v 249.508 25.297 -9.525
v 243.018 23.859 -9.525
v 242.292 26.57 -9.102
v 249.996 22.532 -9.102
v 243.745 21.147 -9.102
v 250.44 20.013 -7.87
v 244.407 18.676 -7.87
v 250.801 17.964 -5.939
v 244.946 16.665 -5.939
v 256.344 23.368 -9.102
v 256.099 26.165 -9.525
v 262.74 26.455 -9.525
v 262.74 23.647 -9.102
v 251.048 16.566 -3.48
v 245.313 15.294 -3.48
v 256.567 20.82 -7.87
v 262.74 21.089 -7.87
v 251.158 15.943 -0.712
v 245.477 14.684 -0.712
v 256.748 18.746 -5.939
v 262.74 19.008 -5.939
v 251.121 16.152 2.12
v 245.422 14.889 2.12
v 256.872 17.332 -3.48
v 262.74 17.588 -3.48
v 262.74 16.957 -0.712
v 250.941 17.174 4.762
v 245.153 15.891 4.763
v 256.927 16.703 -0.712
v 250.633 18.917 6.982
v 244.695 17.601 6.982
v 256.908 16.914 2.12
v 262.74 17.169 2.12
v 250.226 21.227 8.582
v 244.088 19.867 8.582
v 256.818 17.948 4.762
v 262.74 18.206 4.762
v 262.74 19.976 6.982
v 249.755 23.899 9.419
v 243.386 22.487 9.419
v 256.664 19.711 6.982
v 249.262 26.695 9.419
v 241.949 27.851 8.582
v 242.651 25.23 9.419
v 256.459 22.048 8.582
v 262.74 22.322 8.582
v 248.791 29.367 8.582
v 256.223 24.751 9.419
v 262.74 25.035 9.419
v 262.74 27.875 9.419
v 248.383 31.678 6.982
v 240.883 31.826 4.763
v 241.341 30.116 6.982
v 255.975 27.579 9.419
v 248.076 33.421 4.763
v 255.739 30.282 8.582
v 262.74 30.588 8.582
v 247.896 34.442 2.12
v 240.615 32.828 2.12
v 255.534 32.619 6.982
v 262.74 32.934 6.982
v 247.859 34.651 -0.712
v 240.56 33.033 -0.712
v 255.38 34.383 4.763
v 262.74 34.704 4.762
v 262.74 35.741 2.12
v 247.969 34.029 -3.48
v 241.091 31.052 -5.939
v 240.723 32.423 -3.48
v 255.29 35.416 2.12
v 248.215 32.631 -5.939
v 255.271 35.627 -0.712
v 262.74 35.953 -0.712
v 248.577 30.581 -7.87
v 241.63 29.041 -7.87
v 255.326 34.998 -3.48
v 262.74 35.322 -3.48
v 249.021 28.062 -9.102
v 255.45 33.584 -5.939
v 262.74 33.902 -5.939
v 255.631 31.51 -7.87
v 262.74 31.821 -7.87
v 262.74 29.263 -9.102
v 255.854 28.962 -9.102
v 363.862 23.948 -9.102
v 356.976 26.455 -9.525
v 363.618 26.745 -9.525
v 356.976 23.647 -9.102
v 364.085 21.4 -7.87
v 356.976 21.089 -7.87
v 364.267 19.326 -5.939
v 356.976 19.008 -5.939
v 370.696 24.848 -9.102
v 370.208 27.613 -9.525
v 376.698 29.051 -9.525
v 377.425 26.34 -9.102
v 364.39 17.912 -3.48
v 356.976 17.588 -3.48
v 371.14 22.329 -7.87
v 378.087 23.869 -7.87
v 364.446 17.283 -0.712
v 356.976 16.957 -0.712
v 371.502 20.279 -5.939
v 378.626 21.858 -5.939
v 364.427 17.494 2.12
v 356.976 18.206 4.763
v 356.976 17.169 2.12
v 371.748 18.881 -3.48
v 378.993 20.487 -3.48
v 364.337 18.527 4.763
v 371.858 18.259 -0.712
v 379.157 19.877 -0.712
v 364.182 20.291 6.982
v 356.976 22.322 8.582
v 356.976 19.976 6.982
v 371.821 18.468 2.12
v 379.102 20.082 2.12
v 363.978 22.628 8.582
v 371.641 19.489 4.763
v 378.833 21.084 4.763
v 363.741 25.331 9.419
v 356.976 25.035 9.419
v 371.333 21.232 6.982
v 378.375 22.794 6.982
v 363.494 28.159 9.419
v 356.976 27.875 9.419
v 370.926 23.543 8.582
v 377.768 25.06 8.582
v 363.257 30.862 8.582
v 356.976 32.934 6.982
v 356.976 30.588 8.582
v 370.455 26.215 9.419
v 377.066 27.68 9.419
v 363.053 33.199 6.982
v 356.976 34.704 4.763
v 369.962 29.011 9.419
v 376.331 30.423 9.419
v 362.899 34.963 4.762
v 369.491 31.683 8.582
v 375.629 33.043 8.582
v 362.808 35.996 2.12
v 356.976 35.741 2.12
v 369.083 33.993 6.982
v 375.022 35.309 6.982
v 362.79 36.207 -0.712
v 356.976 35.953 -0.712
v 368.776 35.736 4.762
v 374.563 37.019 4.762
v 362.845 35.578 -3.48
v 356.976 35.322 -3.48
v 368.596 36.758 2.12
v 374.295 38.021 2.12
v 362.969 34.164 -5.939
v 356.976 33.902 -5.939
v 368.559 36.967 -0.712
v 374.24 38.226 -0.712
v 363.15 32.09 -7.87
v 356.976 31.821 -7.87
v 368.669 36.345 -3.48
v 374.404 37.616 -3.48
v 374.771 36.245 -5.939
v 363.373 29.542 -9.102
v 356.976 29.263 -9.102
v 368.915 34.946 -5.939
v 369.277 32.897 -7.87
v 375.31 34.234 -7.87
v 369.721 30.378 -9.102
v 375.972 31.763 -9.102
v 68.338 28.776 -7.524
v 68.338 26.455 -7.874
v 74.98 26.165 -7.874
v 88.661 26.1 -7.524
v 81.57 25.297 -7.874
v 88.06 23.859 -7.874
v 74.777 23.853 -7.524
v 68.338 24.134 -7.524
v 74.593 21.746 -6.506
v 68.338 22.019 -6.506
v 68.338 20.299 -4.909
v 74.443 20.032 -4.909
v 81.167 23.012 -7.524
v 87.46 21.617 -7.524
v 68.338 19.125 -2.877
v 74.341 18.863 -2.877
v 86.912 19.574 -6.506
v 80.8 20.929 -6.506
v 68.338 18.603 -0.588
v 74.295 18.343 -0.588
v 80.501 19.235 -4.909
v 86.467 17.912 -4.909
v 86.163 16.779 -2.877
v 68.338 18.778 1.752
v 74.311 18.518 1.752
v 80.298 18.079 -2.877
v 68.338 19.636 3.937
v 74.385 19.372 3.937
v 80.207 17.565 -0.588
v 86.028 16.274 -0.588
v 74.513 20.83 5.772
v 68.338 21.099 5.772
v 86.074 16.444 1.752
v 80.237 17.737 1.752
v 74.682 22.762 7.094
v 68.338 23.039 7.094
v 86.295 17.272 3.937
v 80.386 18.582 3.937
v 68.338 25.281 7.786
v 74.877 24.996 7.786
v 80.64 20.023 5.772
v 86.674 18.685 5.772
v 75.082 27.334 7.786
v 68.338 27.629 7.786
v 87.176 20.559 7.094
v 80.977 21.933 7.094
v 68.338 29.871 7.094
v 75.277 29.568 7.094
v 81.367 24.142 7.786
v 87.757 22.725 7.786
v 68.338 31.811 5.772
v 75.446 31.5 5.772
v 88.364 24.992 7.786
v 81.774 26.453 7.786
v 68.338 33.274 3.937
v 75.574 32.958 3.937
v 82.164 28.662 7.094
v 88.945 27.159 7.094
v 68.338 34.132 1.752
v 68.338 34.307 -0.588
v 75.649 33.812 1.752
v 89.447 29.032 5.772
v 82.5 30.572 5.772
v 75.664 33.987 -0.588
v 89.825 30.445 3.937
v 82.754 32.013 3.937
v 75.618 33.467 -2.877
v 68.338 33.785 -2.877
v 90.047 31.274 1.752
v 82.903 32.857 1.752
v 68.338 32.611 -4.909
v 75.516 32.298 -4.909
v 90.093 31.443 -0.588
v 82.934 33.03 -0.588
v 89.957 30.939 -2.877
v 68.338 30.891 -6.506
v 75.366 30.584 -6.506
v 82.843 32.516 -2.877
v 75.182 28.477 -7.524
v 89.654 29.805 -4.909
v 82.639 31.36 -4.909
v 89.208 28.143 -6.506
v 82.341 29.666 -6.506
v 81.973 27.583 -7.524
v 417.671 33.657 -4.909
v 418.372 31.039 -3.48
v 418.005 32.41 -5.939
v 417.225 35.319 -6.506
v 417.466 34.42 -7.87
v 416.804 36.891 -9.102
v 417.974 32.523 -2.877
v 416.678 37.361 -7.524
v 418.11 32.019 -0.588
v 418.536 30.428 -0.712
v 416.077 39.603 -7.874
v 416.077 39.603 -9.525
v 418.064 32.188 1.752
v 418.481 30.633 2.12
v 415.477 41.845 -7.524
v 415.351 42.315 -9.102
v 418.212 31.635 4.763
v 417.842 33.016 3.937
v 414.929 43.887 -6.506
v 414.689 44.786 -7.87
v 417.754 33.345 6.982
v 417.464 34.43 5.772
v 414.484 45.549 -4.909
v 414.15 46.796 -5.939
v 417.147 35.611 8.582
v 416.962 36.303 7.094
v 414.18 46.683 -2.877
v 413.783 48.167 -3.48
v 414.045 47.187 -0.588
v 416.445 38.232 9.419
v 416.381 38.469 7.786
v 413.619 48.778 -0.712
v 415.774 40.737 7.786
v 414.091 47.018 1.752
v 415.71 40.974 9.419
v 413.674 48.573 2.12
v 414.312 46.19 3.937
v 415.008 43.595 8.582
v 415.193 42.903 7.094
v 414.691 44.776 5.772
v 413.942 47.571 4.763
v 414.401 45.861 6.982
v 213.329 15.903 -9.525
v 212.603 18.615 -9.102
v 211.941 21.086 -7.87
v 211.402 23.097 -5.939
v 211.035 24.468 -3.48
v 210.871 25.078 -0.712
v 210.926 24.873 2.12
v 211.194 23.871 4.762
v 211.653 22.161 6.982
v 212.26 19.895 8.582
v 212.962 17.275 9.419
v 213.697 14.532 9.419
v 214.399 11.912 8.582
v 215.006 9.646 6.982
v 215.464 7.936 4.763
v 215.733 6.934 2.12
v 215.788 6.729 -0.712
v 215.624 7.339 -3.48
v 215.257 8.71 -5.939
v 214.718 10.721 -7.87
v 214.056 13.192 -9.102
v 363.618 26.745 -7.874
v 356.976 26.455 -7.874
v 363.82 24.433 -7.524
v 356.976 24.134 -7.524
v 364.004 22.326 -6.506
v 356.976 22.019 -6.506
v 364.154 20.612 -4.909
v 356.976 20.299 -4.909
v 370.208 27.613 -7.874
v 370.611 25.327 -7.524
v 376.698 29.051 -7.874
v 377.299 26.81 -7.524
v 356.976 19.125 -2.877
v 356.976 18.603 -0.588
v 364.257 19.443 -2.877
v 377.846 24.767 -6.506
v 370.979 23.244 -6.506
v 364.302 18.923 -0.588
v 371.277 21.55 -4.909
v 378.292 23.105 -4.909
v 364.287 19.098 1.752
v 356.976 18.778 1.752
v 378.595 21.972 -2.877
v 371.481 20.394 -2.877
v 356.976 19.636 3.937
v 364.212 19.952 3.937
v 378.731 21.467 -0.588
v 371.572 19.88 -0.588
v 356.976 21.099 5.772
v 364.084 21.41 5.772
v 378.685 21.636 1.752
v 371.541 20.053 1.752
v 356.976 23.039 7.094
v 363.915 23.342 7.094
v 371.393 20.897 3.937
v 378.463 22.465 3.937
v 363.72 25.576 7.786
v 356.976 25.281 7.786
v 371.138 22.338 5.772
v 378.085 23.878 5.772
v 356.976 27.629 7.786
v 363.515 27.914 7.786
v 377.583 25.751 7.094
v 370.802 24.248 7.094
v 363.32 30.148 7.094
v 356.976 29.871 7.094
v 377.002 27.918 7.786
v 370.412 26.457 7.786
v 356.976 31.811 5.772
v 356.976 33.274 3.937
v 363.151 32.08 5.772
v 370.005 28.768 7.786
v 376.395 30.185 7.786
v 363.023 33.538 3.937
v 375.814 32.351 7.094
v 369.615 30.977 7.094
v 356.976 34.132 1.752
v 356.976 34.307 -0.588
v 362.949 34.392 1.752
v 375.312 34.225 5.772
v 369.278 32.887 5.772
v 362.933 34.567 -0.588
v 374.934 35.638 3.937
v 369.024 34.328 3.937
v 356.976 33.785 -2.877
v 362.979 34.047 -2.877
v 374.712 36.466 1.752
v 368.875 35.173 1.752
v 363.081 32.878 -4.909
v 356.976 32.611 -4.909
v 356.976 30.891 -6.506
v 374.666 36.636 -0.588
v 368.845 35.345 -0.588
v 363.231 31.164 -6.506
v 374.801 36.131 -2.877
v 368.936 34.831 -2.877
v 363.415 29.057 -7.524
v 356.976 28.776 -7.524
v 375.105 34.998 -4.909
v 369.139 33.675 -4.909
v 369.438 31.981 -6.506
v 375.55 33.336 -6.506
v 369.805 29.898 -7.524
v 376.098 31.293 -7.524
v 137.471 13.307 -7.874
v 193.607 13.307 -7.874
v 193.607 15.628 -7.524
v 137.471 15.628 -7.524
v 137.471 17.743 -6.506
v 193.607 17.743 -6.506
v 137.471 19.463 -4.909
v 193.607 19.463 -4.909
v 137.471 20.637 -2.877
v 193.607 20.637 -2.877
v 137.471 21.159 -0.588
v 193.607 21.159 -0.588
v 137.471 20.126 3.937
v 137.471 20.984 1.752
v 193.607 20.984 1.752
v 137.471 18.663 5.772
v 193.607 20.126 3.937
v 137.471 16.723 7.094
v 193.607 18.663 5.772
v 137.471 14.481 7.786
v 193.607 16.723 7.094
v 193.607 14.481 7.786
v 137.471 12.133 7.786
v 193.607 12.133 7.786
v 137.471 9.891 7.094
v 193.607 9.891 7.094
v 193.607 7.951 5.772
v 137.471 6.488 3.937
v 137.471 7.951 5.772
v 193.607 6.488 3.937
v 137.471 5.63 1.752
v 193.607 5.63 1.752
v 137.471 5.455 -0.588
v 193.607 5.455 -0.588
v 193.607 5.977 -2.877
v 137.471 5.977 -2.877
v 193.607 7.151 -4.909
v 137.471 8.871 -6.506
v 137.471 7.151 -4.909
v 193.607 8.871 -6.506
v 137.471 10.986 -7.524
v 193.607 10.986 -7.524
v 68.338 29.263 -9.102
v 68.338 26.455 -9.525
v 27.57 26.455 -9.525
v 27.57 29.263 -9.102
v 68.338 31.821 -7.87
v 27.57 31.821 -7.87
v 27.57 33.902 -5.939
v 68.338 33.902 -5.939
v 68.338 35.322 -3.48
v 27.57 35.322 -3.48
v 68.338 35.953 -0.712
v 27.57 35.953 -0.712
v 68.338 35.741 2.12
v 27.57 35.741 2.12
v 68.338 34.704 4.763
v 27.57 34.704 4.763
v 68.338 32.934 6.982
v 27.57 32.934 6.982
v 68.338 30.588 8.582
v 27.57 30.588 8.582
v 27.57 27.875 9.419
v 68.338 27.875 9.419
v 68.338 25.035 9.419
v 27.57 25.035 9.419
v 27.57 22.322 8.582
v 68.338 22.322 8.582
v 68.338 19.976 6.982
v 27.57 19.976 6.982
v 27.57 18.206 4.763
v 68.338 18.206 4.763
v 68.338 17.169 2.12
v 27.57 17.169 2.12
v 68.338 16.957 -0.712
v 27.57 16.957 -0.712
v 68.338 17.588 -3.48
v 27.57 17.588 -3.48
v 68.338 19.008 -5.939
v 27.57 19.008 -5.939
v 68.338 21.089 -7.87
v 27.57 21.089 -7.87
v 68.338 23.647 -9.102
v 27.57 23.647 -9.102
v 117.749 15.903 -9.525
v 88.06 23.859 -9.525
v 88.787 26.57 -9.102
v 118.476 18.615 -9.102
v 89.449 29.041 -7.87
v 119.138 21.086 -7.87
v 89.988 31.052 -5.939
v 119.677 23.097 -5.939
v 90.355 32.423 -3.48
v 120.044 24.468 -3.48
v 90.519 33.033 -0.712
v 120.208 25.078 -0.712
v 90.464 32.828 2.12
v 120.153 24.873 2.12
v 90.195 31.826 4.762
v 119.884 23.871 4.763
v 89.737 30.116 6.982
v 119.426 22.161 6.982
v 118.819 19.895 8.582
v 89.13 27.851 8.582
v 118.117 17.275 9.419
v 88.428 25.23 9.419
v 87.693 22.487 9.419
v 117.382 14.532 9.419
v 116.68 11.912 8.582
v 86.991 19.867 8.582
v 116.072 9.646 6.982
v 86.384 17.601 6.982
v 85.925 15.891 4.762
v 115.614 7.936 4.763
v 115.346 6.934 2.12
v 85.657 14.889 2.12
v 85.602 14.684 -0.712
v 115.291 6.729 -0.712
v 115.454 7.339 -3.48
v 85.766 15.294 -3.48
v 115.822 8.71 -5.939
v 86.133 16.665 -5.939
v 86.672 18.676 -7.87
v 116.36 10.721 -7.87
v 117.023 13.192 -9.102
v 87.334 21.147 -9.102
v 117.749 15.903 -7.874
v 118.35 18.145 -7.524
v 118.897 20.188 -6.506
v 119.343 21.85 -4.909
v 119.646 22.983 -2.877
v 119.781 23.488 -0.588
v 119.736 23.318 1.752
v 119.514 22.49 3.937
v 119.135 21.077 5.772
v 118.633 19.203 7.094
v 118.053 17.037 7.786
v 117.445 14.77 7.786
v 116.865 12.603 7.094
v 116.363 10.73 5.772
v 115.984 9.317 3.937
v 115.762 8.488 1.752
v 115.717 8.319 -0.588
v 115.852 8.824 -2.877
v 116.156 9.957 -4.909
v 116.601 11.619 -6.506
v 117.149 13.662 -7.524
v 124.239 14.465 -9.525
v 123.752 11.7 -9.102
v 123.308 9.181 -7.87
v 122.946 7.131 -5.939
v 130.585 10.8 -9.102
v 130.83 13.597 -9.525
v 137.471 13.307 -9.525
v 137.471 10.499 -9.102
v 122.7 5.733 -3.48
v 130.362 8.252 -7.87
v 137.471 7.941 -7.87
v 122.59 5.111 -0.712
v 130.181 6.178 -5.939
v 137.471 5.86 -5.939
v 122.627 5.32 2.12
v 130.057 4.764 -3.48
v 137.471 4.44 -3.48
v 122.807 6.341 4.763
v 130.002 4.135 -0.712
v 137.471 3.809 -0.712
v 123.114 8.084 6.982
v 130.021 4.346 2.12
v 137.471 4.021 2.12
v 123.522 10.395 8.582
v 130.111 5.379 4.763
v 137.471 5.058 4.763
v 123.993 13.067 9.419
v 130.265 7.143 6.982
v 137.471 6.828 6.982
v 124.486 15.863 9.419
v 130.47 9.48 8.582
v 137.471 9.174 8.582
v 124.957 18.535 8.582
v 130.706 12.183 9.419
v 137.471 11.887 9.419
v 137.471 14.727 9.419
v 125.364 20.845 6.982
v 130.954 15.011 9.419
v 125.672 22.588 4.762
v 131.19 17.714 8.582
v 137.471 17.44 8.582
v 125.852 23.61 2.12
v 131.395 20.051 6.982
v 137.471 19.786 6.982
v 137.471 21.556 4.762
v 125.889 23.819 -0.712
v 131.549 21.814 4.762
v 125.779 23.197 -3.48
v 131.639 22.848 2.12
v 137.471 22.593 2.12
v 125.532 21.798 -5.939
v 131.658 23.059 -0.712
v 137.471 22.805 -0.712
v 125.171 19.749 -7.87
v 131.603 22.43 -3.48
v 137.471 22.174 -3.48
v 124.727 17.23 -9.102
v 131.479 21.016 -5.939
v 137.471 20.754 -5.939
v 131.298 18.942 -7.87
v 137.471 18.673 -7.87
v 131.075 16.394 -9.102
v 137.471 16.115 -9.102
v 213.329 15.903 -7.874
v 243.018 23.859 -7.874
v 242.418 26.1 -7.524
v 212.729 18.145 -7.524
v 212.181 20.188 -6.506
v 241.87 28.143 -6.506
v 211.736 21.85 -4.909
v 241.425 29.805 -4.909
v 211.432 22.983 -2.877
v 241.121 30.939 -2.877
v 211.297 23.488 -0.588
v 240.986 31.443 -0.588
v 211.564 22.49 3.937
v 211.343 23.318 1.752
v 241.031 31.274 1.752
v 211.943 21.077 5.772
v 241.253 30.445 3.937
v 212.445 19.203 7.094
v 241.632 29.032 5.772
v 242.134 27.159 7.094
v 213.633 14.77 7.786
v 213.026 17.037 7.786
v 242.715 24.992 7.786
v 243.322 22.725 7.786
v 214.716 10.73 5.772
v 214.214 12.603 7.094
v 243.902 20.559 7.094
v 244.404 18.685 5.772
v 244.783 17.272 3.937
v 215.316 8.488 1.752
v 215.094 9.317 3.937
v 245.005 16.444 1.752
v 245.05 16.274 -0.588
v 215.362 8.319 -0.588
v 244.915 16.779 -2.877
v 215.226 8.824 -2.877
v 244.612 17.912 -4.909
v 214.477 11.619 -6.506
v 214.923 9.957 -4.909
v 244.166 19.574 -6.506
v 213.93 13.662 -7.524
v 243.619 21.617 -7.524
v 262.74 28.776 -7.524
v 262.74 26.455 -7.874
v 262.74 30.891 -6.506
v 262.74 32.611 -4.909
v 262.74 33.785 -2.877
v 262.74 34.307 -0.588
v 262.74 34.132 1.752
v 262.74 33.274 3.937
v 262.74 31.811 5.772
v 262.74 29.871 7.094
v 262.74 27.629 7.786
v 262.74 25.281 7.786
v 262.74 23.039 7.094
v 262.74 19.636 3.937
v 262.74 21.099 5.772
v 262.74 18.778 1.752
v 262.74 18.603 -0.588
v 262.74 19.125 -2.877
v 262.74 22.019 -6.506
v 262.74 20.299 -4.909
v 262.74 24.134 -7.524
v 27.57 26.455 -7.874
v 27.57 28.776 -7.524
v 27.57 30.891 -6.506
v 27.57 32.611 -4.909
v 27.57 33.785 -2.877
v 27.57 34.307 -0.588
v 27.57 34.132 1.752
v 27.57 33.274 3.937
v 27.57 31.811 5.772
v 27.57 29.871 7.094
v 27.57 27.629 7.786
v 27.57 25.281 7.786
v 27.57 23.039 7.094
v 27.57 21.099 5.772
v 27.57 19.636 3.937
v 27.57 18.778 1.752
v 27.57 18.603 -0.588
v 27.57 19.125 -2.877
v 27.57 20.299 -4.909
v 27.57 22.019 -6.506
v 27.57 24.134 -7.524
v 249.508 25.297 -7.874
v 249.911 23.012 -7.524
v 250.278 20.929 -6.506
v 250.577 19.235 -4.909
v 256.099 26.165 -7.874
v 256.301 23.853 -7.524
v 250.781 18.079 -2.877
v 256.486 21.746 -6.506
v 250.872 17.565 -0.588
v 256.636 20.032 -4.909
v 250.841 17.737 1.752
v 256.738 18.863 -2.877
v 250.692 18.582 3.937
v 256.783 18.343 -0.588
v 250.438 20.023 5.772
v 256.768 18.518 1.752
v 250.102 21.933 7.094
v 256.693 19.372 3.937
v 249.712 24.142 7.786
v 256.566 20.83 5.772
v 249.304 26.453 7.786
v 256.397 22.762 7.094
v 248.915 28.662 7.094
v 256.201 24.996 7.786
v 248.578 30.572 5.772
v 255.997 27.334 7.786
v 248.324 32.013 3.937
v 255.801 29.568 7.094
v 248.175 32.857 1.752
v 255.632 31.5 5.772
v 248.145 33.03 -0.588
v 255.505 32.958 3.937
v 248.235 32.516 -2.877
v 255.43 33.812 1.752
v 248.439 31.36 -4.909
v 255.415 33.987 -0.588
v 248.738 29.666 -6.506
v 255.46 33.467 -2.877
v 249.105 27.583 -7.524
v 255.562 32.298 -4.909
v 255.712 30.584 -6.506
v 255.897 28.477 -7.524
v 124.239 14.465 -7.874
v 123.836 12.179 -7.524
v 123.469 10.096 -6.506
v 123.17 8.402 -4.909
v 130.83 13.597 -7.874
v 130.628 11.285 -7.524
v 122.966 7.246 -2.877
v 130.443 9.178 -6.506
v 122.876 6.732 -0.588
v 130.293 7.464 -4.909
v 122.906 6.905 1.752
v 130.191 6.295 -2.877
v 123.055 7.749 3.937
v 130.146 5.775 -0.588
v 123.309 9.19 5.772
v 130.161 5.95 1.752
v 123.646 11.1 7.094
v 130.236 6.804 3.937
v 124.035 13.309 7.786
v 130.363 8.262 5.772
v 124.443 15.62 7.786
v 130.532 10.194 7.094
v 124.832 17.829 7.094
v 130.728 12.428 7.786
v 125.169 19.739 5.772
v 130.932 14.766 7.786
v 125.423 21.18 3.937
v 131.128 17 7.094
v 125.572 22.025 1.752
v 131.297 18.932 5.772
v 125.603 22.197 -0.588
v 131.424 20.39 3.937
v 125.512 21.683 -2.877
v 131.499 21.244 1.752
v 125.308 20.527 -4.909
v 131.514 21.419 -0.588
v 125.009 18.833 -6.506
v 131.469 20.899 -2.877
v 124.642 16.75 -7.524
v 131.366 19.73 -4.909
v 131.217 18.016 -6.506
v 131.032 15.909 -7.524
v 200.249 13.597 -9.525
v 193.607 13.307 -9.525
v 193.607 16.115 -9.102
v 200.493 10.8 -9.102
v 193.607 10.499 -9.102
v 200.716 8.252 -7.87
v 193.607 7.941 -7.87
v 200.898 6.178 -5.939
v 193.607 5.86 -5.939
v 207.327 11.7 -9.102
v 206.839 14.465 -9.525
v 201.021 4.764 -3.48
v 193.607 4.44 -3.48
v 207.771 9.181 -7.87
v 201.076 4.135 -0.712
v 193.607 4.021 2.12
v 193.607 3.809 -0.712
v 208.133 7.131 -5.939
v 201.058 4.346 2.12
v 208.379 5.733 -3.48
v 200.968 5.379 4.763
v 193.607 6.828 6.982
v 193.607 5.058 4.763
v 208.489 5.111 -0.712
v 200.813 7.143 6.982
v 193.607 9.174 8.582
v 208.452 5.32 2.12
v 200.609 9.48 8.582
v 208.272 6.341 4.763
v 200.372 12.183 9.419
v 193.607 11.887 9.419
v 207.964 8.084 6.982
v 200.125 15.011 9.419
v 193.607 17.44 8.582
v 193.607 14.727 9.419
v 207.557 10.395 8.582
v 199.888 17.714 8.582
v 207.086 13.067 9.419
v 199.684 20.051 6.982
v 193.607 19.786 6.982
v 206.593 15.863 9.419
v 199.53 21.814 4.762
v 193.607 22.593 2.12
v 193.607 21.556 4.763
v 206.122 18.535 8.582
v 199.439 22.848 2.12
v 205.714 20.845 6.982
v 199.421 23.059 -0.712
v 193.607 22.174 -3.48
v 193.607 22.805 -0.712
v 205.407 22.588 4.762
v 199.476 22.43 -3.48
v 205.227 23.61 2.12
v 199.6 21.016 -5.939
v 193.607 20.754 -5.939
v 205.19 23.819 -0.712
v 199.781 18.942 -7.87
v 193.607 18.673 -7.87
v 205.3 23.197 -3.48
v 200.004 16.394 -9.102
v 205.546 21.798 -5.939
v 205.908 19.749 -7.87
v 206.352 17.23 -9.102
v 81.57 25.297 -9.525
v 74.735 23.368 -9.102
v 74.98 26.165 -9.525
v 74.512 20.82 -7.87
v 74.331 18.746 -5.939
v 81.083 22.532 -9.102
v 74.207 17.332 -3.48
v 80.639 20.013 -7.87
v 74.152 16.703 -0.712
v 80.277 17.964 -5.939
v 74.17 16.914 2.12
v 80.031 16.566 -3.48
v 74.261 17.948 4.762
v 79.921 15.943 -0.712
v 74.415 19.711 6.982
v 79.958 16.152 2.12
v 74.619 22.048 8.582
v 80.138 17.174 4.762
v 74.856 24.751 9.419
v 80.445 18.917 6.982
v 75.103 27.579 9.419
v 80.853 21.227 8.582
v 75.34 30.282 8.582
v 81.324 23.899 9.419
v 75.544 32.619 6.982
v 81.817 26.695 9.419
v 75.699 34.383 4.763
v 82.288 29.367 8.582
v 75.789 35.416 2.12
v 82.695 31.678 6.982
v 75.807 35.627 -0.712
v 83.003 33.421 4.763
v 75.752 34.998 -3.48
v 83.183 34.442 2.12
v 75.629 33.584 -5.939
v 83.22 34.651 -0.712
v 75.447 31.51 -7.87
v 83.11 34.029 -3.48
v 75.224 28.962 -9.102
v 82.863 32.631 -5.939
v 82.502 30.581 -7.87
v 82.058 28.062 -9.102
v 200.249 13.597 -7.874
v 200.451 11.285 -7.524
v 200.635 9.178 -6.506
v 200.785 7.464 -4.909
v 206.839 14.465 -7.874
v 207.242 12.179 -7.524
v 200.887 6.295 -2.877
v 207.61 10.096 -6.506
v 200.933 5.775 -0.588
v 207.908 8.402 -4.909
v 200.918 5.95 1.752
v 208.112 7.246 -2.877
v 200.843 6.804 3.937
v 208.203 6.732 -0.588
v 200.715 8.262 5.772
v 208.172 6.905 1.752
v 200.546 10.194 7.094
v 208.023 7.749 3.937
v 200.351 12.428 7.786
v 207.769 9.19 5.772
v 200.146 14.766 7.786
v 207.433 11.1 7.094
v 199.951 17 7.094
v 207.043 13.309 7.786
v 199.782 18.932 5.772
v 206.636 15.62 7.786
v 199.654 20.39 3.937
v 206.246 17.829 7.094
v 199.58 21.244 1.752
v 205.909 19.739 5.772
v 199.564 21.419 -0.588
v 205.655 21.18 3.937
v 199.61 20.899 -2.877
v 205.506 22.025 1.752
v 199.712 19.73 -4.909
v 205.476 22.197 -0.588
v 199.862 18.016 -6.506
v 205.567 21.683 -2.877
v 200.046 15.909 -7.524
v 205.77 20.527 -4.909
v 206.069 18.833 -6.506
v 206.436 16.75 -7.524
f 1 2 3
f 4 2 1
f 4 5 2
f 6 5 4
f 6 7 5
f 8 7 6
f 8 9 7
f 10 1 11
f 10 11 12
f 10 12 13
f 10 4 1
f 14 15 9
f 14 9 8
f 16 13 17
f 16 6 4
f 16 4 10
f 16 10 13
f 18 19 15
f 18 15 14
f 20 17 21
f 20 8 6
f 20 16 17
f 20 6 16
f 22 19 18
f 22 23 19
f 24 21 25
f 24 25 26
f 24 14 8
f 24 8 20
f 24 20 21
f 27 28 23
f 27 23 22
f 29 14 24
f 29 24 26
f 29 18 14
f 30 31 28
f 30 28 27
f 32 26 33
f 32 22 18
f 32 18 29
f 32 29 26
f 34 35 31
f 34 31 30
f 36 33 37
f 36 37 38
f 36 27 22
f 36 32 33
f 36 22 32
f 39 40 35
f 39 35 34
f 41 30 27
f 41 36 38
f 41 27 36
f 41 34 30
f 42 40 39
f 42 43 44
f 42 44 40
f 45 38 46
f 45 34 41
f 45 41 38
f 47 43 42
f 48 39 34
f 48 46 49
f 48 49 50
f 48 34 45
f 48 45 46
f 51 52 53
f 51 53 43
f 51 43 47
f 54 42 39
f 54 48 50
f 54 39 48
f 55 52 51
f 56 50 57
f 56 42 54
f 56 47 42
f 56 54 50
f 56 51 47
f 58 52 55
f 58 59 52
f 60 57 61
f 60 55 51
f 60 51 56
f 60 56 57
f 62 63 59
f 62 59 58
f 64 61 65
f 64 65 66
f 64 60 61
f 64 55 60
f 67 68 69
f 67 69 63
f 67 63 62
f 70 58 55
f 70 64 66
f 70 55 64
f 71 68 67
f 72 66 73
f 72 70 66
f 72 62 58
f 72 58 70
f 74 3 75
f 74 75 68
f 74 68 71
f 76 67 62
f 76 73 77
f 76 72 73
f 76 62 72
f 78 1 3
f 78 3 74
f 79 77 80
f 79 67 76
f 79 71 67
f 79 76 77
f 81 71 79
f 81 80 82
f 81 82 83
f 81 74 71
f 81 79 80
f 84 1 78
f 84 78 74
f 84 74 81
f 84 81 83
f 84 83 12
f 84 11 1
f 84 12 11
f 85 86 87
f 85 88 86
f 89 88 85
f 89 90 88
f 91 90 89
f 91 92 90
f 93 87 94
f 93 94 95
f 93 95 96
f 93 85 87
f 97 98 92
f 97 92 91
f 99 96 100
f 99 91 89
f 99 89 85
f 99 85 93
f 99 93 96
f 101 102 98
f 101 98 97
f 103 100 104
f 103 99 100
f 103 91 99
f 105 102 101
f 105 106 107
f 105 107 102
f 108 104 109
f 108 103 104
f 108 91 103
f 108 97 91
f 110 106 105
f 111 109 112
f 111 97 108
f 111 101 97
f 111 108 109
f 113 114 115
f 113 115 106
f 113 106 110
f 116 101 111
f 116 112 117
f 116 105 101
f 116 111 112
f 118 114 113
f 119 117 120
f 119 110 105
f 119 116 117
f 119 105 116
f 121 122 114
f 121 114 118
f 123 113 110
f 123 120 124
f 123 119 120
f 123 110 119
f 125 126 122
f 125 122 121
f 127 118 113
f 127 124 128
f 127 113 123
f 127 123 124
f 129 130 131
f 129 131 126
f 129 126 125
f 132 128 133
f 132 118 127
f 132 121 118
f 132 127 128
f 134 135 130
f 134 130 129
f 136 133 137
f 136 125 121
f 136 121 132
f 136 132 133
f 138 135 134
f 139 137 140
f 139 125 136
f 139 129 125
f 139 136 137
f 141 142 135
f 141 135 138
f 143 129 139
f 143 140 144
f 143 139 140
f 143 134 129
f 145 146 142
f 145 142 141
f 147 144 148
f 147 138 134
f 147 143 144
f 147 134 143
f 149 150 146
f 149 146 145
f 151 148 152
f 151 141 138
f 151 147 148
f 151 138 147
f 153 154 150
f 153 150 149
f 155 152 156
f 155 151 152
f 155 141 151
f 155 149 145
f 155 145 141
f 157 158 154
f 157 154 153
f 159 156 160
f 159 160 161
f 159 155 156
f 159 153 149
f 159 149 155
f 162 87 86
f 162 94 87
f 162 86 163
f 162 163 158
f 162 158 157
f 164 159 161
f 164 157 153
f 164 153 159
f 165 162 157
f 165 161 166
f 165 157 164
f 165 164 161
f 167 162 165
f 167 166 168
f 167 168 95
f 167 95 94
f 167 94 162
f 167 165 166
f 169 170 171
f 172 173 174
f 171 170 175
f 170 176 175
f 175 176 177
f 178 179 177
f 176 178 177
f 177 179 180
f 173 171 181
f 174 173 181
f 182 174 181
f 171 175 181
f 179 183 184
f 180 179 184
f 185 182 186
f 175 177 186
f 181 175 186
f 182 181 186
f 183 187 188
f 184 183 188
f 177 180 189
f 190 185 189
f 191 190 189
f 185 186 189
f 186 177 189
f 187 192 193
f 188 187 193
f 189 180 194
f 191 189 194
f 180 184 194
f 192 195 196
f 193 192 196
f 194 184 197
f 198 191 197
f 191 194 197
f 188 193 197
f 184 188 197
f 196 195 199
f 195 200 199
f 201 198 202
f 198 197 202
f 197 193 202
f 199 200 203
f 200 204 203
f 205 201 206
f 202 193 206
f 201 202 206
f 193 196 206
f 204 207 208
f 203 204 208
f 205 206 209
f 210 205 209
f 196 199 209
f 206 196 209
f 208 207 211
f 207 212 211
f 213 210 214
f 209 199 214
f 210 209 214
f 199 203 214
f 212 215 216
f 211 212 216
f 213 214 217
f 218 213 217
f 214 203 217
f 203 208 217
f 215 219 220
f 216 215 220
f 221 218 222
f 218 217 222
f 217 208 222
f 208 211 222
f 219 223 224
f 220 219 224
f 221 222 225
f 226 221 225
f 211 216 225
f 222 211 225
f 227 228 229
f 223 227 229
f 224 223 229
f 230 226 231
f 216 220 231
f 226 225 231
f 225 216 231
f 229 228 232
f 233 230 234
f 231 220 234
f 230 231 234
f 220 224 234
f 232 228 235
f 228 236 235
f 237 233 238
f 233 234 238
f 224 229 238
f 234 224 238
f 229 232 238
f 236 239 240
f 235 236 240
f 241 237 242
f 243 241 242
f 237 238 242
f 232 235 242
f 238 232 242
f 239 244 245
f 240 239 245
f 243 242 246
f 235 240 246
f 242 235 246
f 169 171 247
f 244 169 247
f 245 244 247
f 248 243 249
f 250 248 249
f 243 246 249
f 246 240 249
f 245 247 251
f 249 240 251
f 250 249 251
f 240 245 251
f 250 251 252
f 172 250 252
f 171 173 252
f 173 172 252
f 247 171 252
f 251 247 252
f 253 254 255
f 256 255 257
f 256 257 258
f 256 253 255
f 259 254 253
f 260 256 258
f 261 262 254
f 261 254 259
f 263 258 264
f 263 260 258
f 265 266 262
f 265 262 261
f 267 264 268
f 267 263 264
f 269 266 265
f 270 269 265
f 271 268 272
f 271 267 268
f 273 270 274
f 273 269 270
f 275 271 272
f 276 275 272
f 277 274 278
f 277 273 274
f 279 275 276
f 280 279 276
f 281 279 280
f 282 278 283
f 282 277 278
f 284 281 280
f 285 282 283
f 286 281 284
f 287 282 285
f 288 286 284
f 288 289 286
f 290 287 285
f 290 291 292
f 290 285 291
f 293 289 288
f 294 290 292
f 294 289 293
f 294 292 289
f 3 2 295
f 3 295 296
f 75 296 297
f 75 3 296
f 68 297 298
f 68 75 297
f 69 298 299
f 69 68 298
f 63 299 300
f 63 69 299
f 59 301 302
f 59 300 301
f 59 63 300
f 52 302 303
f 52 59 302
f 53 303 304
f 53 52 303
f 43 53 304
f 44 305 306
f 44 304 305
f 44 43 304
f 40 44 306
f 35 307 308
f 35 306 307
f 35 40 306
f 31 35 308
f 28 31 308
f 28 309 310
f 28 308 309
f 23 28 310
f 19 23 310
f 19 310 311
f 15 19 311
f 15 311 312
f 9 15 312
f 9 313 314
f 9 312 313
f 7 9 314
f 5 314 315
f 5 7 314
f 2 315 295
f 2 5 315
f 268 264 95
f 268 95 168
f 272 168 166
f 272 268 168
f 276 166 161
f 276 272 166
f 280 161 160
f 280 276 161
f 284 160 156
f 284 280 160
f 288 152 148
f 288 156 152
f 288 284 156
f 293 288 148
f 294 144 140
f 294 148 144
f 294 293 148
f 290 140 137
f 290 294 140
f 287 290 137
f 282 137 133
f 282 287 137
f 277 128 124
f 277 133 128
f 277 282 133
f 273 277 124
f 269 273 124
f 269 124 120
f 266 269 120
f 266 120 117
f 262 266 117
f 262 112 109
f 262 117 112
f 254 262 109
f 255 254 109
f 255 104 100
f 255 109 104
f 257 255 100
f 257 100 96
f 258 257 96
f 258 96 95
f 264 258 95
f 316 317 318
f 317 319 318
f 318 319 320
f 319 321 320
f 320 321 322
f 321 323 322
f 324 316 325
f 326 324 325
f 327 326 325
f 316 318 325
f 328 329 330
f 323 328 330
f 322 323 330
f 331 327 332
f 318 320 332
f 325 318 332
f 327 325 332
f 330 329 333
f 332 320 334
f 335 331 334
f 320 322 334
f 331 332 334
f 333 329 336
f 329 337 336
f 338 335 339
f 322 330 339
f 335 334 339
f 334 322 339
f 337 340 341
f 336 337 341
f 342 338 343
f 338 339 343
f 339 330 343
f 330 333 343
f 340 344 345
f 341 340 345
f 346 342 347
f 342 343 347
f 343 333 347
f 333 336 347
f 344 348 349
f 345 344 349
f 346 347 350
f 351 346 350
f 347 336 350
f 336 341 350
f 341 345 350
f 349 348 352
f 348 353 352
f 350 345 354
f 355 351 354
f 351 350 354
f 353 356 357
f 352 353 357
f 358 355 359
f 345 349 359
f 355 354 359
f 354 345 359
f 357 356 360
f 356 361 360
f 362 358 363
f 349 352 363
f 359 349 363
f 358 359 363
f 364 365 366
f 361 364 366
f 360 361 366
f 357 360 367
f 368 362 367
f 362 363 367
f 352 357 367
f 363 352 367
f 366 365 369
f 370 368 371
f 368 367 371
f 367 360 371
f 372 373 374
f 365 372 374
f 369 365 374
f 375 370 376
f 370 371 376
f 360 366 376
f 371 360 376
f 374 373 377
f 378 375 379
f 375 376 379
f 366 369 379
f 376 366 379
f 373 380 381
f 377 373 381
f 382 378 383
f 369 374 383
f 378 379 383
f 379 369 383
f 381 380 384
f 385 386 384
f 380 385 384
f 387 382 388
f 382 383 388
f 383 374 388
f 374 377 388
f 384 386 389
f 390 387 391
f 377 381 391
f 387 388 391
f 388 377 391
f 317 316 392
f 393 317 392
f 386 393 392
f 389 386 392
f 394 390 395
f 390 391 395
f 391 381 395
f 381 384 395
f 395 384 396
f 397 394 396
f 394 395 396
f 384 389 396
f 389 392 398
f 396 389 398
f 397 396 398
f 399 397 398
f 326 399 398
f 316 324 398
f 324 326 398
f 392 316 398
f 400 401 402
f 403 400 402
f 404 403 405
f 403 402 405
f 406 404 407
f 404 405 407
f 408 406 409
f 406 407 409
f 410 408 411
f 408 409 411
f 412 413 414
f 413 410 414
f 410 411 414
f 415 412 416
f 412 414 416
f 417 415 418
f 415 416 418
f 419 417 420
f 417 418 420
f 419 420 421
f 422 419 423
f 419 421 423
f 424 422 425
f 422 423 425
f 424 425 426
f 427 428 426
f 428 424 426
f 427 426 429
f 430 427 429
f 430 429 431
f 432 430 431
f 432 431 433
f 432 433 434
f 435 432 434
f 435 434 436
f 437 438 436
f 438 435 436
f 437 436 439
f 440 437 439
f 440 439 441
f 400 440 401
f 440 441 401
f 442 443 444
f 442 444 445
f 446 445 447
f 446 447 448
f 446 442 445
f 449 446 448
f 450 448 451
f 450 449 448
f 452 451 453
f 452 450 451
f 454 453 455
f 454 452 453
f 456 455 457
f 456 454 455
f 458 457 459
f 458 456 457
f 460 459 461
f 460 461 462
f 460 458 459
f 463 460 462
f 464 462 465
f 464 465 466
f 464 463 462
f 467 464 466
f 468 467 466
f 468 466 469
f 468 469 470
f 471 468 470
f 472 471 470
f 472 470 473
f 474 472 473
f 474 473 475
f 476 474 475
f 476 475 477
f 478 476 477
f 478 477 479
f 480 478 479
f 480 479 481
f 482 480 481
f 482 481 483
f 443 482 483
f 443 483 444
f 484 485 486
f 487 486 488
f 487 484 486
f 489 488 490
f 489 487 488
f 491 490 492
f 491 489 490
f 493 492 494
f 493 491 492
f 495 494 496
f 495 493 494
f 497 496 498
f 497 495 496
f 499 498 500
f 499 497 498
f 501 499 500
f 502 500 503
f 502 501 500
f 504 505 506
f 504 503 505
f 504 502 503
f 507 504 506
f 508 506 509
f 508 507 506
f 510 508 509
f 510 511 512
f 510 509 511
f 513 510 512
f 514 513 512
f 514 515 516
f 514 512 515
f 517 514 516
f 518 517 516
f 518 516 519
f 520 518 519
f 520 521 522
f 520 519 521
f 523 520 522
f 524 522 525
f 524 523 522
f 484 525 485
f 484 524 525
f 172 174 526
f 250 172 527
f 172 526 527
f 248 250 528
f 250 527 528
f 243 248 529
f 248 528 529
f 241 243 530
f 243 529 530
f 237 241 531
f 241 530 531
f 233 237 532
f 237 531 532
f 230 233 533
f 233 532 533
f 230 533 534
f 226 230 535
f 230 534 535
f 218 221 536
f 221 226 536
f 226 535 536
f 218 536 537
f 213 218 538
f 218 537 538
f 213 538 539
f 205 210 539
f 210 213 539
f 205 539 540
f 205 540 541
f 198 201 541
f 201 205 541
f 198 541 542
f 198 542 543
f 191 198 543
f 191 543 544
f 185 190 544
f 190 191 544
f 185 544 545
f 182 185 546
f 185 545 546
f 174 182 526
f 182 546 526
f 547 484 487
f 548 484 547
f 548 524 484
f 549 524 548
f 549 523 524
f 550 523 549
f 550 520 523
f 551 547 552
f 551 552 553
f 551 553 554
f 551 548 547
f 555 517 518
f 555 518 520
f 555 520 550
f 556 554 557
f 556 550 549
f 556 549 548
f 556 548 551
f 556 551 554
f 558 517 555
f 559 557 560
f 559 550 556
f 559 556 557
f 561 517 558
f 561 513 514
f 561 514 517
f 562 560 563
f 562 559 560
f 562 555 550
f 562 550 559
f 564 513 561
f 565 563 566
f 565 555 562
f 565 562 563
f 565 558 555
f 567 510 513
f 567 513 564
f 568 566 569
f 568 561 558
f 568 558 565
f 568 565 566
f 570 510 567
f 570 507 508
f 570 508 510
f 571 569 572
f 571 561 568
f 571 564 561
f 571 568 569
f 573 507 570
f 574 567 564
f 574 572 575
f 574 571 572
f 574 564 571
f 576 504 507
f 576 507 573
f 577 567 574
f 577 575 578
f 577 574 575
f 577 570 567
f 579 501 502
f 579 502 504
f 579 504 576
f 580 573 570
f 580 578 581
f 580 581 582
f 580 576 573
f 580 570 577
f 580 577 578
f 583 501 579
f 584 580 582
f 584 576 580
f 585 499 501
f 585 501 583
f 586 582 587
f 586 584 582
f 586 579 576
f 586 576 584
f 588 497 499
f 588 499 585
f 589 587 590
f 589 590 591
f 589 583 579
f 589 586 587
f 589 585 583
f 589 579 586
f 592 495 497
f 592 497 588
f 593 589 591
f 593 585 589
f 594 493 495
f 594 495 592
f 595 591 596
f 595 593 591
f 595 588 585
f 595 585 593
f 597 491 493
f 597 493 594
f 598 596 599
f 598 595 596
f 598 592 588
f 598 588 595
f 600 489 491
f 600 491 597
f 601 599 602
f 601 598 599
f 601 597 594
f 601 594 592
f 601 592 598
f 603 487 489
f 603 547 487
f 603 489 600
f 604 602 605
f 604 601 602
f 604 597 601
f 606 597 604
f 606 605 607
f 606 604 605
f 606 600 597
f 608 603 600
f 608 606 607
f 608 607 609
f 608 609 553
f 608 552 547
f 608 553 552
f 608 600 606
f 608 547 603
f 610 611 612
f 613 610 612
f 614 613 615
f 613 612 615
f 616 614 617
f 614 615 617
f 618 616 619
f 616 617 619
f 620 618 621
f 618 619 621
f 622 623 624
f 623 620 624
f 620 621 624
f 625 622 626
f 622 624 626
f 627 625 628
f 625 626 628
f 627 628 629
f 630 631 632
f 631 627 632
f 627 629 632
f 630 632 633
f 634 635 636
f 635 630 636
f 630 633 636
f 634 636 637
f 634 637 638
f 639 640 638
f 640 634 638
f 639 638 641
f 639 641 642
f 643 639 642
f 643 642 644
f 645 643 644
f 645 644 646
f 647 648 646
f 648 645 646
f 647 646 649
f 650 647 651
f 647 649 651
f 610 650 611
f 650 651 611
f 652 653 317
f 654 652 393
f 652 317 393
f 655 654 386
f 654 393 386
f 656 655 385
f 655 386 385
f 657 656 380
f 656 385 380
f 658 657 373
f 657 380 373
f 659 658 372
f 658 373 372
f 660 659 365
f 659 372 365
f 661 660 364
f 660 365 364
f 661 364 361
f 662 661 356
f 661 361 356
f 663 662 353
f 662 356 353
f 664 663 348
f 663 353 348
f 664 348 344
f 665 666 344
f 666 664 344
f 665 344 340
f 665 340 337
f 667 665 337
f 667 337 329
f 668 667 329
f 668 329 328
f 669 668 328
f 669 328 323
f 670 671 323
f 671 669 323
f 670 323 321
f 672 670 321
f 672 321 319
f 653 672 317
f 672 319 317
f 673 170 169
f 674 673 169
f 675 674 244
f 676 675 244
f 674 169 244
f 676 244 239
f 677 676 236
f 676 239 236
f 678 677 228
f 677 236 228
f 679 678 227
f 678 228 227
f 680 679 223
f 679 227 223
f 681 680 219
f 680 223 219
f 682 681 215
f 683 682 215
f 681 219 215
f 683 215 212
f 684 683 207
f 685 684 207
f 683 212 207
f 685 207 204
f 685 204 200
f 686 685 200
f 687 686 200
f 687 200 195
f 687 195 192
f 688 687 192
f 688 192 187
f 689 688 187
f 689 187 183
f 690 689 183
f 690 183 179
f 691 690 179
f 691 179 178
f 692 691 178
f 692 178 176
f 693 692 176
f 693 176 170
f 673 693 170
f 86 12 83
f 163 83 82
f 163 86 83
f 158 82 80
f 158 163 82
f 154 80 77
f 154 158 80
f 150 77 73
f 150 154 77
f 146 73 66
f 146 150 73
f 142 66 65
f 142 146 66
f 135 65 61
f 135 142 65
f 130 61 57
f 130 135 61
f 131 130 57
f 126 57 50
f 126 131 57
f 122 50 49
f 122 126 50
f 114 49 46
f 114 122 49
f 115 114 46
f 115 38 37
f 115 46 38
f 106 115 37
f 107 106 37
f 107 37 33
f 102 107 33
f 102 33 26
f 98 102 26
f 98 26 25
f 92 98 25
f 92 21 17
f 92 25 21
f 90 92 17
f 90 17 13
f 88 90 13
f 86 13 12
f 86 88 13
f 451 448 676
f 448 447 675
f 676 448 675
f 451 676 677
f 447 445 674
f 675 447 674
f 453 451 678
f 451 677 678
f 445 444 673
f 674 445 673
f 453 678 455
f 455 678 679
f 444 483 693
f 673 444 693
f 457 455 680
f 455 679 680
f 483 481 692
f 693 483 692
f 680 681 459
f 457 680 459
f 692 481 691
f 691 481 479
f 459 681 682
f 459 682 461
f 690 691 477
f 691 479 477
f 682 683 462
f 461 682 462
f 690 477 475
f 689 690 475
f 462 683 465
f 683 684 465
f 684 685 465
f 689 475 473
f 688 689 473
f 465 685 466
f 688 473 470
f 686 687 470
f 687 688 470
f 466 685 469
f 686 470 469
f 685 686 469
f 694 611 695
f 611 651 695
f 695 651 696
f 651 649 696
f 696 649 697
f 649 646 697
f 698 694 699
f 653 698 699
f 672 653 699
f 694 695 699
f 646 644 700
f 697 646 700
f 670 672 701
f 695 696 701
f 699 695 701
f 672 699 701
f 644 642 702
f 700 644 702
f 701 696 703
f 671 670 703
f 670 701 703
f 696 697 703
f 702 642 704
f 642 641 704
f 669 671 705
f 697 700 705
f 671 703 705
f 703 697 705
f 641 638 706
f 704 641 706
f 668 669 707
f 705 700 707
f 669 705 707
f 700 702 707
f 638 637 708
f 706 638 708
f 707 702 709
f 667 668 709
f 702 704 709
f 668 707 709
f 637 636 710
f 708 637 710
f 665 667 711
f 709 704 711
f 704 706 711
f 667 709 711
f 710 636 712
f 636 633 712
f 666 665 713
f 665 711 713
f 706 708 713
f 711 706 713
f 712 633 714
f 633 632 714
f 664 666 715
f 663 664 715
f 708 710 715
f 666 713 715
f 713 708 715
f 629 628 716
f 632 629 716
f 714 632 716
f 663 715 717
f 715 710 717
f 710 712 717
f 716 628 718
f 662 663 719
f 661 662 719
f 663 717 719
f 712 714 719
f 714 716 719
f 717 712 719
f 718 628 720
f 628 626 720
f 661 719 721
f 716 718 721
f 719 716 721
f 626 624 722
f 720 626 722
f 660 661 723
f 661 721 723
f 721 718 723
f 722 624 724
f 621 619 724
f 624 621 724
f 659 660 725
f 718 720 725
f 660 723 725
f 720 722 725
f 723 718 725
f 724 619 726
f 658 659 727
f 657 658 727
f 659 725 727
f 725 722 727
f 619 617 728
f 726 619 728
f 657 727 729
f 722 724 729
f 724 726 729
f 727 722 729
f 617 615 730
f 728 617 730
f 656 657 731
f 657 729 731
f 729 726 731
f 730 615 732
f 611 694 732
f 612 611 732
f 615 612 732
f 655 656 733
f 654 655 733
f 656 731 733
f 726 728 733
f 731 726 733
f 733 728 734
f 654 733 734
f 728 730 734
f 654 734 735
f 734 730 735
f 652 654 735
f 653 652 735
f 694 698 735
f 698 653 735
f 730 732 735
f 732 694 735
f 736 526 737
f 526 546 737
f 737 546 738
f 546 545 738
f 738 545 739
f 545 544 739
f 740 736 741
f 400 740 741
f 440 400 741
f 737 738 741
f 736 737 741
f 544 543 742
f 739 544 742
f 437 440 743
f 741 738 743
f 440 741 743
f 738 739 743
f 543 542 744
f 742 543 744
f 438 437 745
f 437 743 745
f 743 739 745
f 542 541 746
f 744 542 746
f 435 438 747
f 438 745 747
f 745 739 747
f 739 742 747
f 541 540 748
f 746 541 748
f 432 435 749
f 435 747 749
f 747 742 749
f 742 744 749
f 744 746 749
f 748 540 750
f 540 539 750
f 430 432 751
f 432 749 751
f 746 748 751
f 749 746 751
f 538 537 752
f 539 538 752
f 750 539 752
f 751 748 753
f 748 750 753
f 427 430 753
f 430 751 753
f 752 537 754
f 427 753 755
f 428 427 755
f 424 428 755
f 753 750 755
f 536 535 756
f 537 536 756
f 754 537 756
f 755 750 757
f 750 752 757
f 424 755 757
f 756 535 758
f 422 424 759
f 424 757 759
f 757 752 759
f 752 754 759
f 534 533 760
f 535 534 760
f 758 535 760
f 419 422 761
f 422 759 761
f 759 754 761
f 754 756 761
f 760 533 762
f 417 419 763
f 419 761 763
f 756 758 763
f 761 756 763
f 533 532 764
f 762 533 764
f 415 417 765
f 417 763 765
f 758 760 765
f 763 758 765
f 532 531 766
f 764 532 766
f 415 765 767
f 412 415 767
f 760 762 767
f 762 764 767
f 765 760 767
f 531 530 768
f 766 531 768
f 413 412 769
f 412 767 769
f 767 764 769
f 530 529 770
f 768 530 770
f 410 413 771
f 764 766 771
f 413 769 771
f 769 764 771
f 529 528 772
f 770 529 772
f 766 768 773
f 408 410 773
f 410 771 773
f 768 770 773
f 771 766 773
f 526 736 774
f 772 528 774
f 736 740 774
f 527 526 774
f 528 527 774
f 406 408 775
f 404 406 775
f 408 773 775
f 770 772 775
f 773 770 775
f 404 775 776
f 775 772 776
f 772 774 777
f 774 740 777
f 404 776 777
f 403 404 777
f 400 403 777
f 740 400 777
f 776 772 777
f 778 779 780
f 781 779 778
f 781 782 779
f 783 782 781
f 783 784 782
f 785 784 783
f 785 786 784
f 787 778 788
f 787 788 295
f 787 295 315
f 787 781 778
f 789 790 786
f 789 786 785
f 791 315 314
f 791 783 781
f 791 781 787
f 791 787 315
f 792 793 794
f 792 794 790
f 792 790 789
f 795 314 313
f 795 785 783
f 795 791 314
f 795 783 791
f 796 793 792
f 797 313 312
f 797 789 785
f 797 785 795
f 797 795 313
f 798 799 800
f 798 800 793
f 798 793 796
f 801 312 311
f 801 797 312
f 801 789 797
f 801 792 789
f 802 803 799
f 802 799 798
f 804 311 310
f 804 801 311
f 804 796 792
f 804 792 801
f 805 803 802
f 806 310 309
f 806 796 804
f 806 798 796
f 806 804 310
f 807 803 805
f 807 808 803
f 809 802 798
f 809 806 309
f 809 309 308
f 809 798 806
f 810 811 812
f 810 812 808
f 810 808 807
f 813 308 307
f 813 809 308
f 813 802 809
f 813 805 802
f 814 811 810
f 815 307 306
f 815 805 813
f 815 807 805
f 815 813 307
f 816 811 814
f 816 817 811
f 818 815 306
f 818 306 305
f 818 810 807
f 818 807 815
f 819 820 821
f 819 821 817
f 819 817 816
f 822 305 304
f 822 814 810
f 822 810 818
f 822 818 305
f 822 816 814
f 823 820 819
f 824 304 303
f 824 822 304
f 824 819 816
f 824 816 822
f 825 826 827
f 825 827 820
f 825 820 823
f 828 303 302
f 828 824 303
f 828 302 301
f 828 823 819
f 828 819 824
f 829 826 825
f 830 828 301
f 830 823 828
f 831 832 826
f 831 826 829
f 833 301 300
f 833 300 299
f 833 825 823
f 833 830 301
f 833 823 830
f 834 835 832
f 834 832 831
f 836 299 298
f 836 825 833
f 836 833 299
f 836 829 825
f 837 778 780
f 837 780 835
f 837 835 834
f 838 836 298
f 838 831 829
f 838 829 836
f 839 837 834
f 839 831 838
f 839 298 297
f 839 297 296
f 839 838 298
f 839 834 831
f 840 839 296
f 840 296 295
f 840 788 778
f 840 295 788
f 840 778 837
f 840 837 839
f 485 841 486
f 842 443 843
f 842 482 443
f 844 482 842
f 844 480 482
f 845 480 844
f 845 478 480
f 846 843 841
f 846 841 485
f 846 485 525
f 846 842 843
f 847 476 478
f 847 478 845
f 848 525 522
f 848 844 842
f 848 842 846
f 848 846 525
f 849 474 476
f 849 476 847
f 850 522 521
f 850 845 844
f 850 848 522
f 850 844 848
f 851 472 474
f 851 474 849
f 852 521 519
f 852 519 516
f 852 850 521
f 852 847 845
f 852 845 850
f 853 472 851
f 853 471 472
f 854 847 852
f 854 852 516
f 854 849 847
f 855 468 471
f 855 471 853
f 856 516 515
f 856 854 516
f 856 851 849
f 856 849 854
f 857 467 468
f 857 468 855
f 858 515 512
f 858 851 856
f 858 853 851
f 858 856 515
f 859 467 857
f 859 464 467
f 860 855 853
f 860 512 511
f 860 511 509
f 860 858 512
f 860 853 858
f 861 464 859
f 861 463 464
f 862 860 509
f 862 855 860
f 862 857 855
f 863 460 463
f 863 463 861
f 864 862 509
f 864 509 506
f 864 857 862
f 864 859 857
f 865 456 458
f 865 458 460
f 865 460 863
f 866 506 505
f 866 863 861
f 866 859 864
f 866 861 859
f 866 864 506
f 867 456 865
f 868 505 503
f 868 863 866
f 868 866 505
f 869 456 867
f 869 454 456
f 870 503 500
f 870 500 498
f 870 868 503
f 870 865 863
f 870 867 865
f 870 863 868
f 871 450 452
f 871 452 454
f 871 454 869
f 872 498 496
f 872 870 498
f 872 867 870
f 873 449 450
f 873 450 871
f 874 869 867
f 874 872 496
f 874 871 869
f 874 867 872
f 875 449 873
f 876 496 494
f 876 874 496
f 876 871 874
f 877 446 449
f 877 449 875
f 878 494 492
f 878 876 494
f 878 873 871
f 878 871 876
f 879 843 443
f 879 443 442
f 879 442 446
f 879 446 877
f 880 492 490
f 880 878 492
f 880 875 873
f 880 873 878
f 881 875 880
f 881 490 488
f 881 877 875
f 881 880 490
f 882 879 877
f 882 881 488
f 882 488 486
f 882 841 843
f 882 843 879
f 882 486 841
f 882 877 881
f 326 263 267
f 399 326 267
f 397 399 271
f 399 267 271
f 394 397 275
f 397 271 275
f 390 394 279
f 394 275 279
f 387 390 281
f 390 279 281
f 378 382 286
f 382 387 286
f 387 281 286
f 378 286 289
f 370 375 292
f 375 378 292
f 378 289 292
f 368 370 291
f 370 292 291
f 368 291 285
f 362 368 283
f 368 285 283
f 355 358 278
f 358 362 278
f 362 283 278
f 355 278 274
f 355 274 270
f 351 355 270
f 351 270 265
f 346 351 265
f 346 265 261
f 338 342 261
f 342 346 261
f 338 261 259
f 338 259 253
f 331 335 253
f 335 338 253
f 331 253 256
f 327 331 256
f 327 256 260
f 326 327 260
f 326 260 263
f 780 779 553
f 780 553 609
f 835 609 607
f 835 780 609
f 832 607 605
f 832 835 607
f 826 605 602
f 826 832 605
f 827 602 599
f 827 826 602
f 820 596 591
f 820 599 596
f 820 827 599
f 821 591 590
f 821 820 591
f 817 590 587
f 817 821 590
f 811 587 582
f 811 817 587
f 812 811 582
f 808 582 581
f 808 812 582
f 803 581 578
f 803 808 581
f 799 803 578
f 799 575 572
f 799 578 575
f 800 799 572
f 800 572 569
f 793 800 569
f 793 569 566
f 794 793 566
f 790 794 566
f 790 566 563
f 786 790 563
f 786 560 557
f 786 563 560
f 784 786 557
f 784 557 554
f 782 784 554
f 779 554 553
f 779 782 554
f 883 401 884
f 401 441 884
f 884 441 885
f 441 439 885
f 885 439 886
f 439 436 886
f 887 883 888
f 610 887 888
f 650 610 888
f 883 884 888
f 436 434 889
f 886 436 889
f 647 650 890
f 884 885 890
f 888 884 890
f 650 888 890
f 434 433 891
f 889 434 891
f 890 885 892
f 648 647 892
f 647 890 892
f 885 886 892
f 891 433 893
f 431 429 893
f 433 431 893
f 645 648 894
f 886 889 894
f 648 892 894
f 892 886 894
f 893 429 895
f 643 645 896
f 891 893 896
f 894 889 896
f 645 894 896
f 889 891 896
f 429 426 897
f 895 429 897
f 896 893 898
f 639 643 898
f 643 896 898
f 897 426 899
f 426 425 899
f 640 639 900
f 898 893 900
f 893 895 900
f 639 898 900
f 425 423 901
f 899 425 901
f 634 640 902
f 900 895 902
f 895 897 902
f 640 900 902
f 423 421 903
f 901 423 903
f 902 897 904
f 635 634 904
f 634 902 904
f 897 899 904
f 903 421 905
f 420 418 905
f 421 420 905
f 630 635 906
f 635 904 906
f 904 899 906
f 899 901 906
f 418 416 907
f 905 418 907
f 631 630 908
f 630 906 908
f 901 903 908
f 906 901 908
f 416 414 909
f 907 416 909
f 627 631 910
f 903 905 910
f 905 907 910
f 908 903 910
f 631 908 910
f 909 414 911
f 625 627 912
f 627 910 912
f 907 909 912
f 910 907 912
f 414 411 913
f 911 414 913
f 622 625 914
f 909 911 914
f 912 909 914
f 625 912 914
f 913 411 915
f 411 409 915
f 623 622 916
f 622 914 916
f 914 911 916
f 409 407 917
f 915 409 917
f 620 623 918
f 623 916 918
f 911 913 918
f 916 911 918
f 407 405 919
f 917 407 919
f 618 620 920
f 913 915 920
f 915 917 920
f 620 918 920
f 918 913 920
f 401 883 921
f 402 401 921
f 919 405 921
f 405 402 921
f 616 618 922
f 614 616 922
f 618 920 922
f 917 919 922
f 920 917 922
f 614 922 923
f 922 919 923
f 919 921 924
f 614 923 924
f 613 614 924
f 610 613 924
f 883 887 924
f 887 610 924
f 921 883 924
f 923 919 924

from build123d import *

# Parameters (mm, degrees)
SKETCH2_R   = 9.525
SKETCH2_R_2 = 7.874


with BuildPart() as part:
    # Sweep1: sweep along a path in Sketch1
    with BuildLine(Plane.XY) as sweep1_path:
        Line((27.57027, 26.455034237), (68.338349684, 26.455034237))
        ThreePointArc((68.338349684, 26.455034237), (78.284445531, 25.803132673), (88.060360921, 23.8585822))
        Line((88.060360921, 23.8585822), (117.749211055, 15.903478782))
        ThreePointArc((117.749211055, 15.903478782), (127.525126444, 13.958928309), (137.471222292, 13.307026745))
        Line((137.471222292, 13.307026745), (193.607381659, 13.307026745))
        ThreePointArc((193.607381659, 13.307026745), (203.553477506, 13.958928309), (213.329392896, 15.903478782))
        Line((213.329392896, 15.903478782), (243.01824303, 23.8585822))
        ThreePointArc((243.01824303, 23.8585822), (252.79415842, 25.803132673), (262.740254267, 26.455034237))
        Line((262.740254267, 26.455034237), (356.976413635, 26.455034237))
        ThreePointArc((356.976413635, 26.455034237), (366.922509482, 27.1069358), (376.698424872, 29.051486273))
        Line((376.698424872, 29.051486273), (416.077365926, 39.603041728))
    # Sketch2 → Sweep1 (sweep)
    with BuildSketch(Plane(origin=(27.57027, 26.455034237, 0), x_dir=(0, 0, -1), z_dir=(1, 0, 0))):
        Circle(SKETCH2_R)
        Circle(SKETCH2_R_2, mode=Mode.SUBTRACT)
    sweep(path=sweep1_path.line)


solid = part.part
